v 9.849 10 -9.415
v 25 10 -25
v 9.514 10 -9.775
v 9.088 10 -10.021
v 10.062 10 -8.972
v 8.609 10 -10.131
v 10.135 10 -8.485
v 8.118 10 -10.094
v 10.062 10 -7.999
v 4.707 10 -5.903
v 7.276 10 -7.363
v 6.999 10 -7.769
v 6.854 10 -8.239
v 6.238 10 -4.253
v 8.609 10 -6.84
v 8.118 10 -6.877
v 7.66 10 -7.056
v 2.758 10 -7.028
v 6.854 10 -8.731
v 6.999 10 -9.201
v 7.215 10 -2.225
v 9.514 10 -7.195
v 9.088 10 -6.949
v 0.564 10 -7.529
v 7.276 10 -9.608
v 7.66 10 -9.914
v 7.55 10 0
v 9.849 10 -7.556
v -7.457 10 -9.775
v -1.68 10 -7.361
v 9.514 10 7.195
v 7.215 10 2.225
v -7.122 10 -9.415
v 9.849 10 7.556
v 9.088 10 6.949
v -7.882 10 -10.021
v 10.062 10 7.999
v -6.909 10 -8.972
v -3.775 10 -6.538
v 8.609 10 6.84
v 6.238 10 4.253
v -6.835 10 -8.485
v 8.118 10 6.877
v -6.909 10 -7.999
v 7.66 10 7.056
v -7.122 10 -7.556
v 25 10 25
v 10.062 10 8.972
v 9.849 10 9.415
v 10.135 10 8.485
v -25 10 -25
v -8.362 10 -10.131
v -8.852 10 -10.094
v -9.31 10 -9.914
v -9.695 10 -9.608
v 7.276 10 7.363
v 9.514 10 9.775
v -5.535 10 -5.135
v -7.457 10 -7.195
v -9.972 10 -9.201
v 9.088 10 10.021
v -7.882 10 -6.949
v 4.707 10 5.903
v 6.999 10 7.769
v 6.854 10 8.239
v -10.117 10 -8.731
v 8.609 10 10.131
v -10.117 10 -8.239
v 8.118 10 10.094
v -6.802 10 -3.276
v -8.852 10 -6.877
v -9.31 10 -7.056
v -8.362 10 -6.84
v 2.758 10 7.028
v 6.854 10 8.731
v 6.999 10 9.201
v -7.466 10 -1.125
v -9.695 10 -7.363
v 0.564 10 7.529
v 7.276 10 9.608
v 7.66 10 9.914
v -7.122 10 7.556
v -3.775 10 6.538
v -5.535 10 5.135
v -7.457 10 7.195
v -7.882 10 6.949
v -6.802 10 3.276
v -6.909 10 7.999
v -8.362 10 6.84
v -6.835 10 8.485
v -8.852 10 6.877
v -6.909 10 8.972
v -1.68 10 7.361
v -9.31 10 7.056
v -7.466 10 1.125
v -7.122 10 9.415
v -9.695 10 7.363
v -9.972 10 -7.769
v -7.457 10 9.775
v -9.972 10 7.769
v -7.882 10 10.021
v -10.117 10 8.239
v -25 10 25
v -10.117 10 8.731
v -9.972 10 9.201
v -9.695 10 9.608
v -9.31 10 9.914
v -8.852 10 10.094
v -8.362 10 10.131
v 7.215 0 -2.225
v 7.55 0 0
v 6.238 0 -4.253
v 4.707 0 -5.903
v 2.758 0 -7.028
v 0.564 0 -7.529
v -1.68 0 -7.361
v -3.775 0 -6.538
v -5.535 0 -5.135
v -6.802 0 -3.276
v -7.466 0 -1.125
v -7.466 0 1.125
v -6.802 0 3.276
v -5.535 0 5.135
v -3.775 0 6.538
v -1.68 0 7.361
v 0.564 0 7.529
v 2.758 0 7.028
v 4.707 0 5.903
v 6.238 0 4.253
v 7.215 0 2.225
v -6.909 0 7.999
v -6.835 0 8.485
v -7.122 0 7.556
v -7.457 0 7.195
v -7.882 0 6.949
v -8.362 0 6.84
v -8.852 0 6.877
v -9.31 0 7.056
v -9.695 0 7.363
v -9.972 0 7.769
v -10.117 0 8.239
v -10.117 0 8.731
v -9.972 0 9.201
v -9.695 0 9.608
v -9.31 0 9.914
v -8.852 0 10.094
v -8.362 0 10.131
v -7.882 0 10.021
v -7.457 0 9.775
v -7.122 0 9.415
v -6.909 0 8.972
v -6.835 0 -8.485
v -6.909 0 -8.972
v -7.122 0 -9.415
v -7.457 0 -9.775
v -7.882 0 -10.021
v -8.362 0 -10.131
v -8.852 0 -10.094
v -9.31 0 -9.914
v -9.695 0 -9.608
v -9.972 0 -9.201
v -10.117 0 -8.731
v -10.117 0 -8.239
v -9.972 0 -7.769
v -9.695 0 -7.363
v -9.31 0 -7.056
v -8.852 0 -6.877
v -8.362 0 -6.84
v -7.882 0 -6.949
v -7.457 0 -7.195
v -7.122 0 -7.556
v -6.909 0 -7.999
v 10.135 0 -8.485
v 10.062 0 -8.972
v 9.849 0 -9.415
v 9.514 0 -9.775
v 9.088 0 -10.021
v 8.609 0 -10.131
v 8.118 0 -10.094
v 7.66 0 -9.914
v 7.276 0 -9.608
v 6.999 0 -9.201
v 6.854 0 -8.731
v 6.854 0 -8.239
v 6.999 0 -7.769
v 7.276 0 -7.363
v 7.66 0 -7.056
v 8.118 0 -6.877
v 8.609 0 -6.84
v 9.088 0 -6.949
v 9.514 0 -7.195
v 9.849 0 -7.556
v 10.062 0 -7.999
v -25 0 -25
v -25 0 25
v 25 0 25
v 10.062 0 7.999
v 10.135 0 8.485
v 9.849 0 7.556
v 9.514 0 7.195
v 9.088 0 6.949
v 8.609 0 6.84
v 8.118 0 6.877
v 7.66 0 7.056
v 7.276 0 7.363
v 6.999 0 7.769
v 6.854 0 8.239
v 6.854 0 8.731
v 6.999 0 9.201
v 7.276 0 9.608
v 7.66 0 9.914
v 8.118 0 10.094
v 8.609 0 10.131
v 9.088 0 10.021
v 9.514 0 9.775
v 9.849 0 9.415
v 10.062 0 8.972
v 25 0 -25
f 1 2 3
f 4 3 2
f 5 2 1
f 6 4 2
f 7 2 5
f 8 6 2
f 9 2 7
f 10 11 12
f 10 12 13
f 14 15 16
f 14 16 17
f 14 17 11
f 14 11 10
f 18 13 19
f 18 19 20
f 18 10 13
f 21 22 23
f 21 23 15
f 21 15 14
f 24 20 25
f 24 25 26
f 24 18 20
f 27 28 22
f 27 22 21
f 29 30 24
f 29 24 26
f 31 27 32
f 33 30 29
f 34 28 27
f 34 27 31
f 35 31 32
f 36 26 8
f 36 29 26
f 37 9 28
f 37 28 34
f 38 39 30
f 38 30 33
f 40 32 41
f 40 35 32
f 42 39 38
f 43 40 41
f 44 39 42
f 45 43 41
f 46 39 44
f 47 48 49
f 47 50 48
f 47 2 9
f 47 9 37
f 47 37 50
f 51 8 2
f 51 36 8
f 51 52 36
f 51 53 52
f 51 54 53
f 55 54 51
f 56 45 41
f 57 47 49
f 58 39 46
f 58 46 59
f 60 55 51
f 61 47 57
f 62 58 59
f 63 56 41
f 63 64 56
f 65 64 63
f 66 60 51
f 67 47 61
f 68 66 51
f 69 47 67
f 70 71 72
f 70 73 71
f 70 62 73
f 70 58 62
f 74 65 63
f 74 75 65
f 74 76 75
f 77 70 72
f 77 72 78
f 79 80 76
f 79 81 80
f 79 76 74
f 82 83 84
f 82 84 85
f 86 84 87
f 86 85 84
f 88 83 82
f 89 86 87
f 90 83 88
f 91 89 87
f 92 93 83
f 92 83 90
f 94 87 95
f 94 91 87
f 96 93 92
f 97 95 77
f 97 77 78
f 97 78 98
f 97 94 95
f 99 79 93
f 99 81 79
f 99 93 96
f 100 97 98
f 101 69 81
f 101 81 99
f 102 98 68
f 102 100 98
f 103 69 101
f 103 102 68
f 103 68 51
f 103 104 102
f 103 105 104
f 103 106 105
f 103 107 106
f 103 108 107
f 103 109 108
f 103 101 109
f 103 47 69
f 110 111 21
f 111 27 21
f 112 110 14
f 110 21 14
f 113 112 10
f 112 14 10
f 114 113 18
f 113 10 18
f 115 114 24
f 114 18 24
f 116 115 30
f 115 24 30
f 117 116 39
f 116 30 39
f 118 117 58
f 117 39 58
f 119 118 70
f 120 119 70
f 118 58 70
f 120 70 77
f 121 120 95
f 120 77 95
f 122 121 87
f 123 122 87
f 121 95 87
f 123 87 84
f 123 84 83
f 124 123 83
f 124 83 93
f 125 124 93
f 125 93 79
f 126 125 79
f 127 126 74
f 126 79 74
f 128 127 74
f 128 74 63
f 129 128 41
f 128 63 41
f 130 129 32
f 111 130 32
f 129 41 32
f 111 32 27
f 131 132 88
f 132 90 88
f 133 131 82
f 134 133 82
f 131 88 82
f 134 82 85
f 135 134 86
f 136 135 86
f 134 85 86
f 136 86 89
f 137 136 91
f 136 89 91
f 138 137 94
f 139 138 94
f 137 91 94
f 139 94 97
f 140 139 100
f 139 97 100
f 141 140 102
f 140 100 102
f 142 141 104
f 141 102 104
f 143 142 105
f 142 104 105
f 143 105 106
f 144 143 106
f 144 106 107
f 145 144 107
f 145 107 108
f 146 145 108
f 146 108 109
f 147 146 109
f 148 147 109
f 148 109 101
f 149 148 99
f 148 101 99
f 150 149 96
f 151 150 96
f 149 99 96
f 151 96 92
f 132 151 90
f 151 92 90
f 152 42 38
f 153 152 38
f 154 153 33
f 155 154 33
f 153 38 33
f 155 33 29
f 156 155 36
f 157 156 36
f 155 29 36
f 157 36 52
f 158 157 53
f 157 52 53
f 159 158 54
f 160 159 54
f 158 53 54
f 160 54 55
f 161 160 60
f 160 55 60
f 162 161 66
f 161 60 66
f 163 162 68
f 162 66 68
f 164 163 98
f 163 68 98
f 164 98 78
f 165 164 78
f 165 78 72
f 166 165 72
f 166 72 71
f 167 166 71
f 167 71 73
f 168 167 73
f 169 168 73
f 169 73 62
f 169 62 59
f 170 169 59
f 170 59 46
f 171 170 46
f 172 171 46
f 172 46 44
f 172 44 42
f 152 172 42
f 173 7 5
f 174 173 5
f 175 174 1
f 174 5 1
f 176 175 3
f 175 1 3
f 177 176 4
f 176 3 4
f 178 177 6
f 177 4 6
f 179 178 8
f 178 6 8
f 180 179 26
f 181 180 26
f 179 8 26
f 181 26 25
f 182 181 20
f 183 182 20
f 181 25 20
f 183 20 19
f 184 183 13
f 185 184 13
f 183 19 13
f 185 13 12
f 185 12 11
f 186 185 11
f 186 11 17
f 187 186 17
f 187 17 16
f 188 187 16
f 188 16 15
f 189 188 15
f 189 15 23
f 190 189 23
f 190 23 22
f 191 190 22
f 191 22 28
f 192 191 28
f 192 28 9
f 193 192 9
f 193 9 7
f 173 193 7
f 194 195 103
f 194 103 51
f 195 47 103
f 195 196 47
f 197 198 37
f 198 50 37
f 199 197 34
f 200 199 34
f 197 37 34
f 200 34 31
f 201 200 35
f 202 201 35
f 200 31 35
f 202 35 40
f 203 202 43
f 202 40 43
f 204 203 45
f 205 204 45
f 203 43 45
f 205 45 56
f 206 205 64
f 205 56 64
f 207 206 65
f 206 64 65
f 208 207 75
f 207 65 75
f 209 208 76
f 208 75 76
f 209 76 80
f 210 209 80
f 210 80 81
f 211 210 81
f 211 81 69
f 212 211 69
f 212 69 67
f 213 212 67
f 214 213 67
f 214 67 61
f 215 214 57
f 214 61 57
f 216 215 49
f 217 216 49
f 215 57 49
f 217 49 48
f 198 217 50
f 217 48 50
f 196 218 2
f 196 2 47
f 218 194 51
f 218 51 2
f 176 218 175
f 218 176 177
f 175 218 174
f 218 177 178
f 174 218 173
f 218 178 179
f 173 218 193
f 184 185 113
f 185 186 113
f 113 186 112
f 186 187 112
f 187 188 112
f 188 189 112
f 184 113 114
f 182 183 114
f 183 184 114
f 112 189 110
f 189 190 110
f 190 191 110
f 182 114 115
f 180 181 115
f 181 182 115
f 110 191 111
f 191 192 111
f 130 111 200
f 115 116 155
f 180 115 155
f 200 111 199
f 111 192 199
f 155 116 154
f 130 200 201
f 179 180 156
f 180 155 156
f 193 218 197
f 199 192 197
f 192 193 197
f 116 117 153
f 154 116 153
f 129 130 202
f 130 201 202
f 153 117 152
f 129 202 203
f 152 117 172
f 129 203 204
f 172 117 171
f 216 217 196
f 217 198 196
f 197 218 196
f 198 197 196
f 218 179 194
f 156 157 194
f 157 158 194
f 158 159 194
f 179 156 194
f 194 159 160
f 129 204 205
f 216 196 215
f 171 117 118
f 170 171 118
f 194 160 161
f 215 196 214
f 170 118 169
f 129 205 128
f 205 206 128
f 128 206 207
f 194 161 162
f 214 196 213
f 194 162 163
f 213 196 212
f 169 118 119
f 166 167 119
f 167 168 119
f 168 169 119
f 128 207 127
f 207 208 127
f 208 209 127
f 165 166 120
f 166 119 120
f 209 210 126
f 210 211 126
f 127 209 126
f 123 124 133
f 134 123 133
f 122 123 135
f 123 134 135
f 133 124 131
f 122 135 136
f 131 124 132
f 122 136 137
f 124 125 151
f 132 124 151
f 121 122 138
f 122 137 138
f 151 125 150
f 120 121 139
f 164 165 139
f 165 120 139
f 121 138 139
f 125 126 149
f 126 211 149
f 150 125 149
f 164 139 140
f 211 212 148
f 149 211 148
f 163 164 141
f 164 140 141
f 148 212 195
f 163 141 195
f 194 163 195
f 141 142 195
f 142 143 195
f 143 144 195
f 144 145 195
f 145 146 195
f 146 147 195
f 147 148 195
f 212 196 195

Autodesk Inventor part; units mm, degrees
ref_plane "YZ Plane" through (0, 0, 0) normal (1, 0, 0) x (0, 1, 0)
ref_plane "XZ Plane" through (0, 0, 0) normal (0, 1, 0) x (-1, 0, 0)
ref_plane "XY Plane" through (0, 0, 0) normal (0, 0, 1) x (1, 0, 0)
sketch "Sketch1" plane through (0, 0, 0) normal (0, 1, 0) x (-1, 0, 0)
  line L0 (25, -25) -> (-25, -25)
  line L1 (-25, -25) -> (-25, 25)
  line L2 (-25, 25) -> (25, 25)
  line L3 (25, 25) -> (25, -25)
  line L4 (25, -25) -> (-25, 25) construction
  line L5 (-25, -25) -> (25, 25) construction
  point P0 (0, 0)
  dimension "d0" = 50
  dimension "d1" = 50
extrude "Extrusion1" add sketch "Sketch1" along normal blind 10
sketch "Sketch2" plane through (0, 10, 0) normal (0, 1, 0) x (1, 0, 0)
  circle A0 centre (0, 0) radius 7.55
  circle A1 centre (8.4853, 8.4853) radius 1.65
  line L0 (0, 0) -> (8.4853, 8.4853)
  line L1 (0, 0) -> (12, 0) construction
  circle A2 centre (-8.4853, 8.4853) radius 1.65
  circle A3 centre (-8.4853, -8.4853) radius 1.65
  circle A4 centre (8.4853, -8.4853) radius 1.65
  dimension "d4" = 15.1
  dimension "d5" = 3.3
  dimension "d7" = 12
  dimension "d8" = 45
  dimension "d11" = 360
extrude "lmk8uu holes" cut sketch "Sketch2" against normal up to next
equation "\"d4\" = center_hole"
equation "\"d5\" = mount_hole"
equation "\"d7\" = hole_radius"
equation "\"hole_radius\" = 12"
equation "\"mount_hole\" = 3.3"
equation "\"center_hole\" = 15.1"
properties part number "lmk8uugen"
